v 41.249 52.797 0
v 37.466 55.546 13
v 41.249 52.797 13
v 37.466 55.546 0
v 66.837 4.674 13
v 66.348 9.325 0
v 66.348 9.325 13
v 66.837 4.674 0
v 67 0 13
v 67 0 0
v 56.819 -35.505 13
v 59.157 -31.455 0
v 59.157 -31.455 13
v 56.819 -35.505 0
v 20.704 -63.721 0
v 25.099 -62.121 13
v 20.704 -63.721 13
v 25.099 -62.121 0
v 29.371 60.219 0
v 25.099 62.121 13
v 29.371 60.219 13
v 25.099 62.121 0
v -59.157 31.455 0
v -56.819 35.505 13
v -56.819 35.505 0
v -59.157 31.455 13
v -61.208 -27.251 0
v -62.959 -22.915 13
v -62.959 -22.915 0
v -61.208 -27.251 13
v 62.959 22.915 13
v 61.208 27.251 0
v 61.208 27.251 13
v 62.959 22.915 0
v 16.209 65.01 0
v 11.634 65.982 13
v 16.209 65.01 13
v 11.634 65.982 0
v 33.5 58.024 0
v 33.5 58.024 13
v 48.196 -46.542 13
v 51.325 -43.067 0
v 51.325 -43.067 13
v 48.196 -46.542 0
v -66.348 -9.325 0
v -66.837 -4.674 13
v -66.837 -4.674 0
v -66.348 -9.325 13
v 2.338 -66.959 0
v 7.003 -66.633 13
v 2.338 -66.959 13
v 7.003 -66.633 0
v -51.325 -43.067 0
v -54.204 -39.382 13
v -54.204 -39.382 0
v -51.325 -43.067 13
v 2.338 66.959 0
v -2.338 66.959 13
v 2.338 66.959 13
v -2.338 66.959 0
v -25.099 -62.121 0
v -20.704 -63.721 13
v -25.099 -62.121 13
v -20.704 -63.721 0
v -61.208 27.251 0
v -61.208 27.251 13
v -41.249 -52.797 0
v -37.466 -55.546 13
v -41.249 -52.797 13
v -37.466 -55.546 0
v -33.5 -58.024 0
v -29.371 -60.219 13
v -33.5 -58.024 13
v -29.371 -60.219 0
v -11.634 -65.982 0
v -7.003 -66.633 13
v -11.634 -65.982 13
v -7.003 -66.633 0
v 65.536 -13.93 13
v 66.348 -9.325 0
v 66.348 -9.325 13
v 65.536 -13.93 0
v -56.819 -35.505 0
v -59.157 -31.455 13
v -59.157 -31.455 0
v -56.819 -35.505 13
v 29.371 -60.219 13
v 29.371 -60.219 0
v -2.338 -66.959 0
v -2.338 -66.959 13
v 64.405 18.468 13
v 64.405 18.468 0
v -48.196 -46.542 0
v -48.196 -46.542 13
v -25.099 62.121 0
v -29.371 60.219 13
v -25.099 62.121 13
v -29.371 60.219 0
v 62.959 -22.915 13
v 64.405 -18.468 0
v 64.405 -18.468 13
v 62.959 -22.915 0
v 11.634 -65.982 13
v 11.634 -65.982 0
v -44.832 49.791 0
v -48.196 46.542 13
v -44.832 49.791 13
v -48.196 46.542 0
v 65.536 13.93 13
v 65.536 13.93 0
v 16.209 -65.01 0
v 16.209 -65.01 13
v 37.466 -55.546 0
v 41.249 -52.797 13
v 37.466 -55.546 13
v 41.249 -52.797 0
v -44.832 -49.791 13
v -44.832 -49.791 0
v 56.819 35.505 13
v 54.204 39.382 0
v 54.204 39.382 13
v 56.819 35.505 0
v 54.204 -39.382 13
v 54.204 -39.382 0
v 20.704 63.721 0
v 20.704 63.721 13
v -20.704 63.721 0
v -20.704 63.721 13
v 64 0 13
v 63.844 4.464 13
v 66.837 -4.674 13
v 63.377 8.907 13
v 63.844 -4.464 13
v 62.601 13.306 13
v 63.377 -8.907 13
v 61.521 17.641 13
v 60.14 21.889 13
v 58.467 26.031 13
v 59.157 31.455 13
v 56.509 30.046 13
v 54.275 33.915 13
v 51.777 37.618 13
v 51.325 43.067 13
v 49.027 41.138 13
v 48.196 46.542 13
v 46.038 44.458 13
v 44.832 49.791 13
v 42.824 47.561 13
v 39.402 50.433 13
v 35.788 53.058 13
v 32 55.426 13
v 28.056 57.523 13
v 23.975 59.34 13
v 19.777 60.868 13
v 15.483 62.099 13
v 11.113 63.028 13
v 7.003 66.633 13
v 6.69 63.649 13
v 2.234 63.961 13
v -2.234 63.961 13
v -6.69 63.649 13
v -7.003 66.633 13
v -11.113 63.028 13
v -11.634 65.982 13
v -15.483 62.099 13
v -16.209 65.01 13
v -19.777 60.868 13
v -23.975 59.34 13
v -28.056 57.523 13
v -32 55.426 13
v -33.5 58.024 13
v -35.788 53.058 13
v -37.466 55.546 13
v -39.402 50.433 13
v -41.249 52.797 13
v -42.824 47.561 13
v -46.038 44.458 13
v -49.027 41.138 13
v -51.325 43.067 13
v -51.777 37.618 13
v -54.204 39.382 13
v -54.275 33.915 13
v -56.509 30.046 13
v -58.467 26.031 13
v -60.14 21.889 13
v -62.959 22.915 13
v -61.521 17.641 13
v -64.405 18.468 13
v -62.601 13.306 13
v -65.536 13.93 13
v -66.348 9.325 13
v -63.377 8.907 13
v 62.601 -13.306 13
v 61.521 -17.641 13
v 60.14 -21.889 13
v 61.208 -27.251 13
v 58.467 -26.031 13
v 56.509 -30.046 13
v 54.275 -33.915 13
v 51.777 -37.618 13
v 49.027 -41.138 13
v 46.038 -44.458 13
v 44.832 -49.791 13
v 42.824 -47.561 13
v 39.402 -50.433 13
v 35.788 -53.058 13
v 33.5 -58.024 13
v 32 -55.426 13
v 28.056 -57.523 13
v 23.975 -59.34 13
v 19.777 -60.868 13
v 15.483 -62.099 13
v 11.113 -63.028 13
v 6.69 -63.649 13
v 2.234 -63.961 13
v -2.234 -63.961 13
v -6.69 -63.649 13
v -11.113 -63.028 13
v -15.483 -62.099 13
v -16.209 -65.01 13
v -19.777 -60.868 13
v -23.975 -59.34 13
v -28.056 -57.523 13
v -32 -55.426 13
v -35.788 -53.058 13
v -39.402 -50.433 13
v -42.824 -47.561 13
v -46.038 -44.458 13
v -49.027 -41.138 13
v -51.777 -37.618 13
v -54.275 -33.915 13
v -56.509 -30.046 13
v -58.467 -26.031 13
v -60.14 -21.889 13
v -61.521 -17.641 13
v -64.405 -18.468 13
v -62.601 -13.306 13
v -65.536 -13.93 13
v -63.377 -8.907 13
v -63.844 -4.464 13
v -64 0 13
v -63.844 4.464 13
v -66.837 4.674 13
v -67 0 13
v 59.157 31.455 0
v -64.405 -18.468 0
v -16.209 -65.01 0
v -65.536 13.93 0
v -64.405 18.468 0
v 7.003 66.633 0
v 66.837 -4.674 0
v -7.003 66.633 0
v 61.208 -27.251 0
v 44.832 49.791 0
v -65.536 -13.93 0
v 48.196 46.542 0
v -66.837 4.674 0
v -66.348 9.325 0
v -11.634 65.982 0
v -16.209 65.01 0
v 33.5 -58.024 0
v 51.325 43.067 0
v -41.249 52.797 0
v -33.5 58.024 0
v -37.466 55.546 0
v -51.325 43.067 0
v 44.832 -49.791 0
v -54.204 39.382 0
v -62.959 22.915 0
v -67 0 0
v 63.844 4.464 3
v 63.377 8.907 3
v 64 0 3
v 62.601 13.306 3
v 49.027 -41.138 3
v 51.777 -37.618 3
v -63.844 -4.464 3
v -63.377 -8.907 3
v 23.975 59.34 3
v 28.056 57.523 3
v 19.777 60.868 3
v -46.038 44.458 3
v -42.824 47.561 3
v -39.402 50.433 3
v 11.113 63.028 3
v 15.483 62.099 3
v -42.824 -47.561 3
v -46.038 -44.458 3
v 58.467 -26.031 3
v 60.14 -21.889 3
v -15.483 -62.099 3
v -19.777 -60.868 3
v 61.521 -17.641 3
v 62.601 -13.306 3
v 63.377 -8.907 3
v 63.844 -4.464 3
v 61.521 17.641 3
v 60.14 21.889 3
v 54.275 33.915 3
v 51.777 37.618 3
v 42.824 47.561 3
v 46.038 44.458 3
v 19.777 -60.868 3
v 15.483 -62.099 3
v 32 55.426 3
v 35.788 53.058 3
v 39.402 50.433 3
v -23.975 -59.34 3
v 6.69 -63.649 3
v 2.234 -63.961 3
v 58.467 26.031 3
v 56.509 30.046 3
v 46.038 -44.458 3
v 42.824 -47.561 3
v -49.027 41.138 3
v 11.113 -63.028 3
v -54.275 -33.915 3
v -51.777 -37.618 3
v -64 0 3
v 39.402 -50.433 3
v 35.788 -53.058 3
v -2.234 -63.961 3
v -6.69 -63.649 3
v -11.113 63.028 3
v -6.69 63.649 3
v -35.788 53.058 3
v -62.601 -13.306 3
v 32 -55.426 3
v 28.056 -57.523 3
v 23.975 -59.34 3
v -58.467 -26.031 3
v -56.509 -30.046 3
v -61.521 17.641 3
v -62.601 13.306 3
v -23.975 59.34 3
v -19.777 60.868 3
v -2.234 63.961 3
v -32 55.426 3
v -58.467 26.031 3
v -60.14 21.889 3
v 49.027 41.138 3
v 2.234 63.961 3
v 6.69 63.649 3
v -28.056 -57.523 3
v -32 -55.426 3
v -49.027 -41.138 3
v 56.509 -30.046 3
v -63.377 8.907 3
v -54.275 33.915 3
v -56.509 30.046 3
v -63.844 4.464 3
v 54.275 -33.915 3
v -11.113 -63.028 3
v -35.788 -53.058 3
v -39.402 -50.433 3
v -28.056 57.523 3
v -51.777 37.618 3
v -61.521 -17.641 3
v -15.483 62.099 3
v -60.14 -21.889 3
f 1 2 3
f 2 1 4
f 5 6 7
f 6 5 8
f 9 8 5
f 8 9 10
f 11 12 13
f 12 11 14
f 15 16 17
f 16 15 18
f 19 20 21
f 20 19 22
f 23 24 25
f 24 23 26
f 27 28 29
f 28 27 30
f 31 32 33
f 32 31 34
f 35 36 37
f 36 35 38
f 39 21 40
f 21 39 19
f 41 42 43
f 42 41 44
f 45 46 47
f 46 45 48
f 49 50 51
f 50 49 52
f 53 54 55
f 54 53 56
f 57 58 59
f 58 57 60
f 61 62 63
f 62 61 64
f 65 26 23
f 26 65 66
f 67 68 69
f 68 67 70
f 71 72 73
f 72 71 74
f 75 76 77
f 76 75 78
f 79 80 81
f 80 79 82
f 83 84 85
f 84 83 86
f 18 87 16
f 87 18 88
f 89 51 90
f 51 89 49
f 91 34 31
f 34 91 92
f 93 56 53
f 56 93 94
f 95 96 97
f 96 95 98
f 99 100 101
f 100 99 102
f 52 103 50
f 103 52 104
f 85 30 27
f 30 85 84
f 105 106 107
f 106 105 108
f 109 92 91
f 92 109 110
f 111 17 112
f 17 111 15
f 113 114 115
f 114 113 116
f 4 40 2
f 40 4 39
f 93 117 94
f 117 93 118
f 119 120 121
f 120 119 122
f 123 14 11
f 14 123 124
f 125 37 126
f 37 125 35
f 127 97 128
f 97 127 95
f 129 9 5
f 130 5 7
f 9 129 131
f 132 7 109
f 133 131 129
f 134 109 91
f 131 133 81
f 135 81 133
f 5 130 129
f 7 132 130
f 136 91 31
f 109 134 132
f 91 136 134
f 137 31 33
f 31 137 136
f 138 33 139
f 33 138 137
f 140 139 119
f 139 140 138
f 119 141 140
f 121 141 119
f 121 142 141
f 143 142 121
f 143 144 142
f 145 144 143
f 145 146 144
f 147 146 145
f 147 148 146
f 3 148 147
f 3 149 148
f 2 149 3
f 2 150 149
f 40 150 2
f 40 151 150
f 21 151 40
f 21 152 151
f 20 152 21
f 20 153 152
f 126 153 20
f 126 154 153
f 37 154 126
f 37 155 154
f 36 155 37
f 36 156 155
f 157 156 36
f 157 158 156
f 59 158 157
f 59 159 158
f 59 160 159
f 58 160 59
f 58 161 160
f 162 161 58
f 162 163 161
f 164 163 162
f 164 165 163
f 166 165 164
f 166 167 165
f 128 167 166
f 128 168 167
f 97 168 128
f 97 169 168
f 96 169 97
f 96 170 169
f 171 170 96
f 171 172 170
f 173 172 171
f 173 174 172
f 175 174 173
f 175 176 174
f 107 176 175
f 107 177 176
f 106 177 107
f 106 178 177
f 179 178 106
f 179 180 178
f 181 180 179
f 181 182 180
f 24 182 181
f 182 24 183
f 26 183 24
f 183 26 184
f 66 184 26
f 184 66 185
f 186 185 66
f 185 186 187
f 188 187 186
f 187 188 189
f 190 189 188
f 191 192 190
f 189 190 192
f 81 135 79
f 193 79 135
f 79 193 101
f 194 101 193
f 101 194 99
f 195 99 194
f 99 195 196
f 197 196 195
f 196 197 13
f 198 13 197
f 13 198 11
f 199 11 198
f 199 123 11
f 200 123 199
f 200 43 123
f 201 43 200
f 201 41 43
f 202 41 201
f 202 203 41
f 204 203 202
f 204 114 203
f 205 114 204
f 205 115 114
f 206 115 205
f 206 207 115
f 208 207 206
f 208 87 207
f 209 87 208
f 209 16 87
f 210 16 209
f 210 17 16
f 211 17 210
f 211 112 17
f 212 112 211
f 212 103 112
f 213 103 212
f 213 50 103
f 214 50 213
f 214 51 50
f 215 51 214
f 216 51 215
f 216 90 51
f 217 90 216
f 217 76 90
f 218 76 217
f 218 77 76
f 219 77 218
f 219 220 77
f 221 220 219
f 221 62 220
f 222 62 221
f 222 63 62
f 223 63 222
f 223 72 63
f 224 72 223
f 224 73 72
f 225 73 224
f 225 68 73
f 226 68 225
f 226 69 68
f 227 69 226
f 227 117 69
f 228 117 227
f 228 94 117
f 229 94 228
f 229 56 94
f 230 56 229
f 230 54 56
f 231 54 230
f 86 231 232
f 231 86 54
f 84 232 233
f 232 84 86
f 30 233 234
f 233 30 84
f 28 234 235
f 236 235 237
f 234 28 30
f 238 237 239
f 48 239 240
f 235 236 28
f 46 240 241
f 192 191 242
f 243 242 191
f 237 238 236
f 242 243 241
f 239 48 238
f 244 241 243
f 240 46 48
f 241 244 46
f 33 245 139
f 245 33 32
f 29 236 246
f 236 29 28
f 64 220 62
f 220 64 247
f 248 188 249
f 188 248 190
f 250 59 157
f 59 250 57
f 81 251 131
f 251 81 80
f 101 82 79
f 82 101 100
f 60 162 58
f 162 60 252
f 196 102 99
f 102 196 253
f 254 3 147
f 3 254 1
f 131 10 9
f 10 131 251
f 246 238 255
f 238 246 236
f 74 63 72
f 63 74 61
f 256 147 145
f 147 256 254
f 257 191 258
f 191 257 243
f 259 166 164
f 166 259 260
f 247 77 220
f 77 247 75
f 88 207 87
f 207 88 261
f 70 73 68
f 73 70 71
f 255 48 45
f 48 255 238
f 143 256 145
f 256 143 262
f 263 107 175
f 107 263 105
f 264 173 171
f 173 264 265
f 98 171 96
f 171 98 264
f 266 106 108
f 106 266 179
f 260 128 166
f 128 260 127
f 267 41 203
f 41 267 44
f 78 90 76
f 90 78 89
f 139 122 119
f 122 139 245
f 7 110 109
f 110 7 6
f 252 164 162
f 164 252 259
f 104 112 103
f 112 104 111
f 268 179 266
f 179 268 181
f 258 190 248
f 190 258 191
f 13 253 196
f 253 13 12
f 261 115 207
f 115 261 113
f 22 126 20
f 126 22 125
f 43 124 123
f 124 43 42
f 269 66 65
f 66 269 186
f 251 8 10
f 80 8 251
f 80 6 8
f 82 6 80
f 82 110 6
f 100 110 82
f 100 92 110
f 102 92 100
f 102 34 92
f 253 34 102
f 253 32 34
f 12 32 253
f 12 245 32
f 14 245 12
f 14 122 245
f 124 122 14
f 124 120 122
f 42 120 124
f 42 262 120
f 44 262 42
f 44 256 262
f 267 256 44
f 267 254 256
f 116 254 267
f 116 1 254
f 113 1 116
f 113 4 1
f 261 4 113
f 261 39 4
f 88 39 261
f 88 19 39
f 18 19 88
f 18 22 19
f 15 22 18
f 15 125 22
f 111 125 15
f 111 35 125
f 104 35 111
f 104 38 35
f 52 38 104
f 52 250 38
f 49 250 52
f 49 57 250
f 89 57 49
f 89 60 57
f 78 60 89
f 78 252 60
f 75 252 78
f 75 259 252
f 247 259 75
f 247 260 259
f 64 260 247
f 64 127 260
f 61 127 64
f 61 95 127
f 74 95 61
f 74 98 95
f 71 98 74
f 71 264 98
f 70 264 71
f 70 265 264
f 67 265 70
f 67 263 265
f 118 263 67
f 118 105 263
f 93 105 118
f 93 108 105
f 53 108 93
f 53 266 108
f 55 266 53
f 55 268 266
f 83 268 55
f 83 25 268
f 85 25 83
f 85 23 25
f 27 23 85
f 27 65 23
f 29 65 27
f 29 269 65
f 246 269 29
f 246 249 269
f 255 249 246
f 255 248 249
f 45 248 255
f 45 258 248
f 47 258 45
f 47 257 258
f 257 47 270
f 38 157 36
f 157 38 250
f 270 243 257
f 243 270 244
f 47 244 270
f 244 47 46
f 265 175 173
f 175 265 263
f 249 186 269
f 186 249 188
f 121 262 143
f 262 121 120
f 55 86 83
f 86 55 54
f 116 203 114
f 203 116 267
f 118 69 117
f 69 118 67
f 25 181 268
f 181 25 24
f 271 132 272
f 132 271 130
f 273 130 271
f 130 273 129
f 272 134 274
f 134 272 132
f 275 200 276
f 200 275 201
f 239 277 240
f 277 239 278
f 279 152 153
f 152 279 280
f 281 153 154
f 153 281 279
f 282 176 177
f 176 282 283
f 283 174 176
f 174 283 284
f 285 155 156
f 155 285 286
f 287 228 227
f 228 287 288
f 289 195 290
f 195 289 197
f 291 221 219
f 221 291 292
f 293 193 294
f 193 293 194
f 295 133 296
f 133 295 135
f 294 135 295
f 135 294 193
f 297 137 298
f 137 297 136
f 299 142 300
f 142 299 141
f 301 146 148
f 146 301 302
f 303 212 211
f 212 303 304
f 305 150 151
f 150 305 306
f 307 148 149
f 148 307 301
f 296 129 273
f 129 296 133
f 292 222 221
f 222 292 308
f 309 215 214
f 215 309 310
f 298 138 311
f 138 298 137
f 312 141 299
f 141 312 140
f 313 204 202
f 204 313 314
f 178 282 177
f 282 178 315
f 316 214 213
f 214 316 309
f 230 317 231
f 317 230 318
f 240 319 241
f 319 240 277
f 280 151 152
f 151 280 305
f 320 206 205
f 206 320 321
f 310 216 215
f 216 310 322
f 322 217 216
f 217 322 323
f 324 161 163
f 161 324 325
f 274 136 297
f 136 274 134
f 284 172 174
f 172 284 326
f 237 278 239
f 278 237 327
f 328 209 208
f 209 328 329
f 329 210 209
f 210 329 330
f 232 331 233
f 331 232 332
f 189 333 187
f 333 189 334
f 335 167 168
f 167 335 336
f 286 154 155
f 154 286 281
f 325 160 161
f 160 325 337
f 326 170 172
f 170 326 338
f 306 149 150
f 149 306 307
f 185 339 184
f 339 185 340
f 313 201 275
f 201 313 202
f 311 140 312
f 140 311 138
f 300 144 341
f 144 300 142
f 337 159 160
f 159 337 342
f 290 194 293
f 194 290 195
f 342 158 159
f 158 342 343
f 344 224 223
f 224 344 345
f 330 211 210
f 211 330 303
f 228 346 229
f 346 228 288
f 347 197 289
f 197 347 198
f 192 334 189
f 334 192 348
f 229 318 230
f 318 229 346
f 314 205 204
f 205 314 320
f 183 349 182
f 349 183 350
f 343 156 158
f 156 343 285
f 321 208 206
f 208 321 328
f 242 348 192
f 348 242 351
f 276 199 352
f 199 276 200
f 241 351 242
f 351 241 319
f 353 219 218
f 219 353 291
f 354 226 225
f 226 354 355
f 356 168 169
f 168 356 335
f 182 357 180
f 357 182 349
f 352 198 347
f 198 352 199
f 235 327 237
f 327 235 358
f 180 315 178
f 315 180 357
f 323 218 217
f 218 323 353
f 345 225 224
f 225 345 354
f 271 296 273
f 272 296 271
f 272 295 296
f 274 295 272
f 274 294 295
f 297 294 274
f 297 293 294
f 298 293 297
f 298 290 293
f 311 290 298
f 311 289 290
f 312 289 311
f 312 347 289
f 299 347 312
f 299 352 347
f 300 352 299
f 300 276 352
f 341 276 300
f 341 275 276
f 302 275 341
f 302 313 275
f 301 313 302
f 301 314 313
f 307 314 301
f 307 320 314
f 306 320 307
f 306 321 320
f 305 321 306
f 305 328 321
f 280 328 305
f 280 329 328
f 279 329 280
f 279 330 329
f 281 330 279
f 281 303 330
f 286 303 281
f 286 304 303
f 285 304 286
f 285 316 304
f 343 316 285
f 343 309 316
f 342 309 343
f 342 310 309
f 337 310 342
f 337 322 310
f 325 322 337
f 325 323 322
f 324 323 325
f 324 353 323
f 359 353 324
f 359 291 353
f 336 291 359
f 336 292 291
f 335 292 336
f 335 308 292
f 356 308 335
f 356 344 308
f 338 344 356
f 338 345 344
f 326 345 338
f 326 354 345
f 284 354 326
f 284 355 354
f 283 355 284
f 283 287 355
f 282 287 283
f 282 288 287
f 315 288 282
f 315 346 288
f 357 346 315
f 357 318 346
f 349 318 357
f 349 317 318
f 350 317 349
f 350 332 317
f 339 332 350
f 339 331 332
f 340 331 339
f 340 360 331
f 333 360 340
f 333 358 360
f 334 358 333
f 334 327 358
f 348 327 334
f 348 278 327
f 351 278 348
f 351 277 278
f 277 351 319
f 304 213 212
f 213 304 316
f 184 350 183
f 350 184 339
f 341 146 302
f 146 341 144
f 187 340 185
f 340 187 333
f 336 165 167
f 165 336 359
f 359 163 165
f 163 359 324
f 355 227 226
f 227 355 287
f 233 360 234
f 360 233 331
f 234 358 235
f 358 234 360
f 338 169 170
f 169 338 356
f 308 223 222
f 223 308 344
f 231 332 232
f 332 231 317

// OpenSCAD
// Copyright 2022 by Excretia of Unconscious Processes, LLC

/* Set up some variables  */

$fa = 4;    // minimum fragment angle (low number=high quality, def=12)
diam = 128; // diameter of the screen
dep = 10;   // depth of the screen section

module screen_lid() {
  difference() {
    translate([ 0, 0, (dep + 3) / 2 ]) cylinder(h = dep + 3, d = diam + 6, center = true);
    translate([ 0, 0, (dep) / 2 + 3 ]) cylinder(h = dep, d = diam, center = true);
  }
}

screen_lid();
